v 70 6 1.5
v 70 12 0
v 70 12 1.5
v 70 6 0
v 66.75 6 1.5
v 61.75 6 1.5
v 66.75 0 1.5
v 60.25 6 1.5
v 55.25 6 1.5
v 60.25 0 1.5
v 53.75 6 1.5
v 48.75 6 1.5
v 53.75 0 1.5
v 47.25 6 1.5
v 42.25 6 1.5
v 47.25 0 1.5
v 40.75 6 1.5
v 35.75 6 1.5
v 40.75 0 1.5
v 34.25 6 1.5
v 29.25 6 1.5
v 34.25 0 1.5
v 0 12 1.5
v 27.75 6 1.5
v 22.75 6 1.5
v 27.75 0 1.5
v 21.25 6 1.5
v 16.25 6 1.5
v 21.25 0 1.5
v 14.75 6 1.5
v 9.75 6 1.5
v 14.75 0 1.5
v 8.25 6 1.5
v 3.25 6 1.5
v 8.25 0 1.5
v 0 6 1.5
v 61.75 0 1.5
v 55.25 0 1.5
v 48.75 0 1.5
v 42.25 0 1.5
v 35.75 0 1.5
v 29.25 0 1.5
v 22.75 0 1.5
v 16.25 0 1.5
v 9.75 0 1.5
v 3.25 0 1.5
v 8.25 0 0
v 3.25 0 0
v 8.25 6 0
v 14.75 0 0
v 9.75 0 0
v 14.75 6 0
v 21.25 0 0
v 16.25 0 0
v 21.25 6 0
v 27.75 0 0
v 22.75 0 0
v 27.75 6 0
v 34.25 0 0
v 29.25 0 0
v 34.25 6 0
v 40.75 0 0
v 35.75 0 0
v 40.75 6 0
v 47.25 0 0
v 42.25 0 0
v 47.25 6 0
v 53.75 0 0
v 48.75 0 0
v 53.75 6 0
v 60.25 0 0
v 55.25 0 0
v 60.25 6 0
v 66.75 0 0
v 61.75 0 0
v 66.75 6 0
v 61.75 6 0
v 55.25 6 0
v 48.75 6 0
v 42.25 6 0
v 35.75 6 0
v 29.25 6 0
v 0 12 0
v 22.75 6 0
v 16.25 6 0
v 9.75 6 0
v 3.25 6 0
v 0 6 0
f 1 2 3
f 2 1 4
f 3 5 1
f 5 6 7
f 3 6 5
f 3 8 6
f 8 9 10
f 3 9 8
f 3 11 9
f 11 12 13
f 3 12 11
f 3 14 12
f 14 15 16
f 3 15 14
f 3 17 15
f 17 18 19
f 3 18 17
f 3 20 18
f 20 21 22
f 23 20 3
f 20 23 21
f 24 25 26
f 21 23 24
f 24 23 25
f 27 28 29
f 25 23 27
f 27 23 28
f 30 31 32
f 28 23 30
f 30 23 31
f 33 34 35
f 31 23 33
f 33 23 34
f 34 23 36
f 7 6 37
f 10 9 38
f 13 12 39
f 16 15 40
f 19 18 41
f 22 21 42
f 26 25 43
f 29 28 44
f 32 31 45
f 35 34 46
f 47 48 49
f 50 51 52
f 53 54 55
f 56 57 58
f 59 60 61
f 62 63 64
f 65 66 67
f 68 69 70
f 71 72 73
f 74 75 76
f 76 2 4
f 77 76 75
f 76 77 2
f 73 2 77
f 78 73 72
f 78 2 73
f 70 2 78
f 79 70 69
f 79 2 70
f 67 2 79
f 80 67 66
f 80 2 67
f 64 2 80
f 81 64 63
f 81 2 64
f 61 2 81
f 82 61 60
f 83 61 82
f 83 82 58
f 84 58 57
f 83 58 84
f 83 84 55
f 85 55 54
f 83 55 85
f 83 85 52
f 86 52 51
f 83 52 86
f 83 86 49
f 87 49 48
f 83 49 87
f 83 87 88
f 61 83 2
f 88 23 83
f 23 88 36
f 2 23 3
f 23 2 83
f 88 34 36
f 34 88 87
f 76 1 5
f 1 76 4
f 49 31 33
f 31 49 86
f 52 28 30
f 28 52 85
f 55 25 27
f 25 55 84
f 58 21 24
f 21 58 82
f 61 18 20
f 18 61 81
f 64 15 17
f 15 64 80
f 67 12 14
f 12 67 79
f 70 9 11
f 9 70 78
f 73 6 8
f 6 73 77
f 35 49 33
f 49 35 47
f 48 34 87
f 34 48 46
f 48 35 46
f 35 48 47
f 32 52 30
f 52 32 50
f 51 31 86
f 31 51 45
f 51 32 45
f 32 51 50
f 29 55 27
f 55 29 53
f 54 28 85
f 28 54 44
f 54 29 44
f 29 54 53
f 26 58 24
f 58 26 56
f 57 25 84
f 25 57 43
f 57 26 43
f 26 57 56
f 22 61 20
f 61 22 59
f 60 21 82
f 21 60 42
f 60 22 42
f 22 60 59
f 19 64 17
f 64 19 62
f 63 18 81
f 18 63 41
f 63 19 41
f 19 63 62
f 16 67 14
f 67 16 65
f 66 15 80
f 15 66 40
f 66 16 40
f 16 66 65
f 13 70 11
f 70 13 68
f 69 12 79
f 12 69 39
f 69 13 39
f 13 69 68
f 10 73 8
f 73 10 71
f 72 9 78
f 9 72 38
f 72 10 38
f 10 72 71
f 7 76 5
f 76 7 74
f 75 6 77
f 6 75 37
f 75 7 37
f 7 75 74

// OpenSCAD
// 10-well Agarose Gel Comb
// Designed for FDM printing, lying flat on the XY plane (Z=0).
// Dimensions in millimetres.

// --- Dimensions ---
$fn = 100; // High resolution for smooth edges

// Spine dimensions
SPINE_LENGTH = 70;  // X
SPINE_WIDTH = 12;   // Y
PLATE_THICKNESS = 1.5; // Z

// Tooth dimensions
TOOTH_WIDTH = 5.0;  // X
TOOTH_LENGTH = 12;  // Y (extends from spine edge)
NUM_TEETH = 10;
GAP_SIZE = 1.5;     // Gap between teeth

// --- Calculations ---
// Total width of the tooth row
TOOTH_ROW_WIDTH = (NUM_TEETH * TOOTH_WIDTH) + ((NUM_TEETH - 1) * GAP_SIZE);

// Offset to center the tooth row on the spine in X
X_OFFSET = (SPINE_LENGTH - TOOTH_ROW_WIDTH) / 2;

// Position of the spine edge where teeth hang (in -Y direction)
// Spine goes from -SPINE_WIDTH/2 to +SPINE_WIDTH/2.
// Teeth hang from the edge at -SPINE_WIDTH/2.
SPINE_EDGE_Y = -SPINE_WIDTH / 2;

// --- Main Body (Spine) ---
// Create the flat plate spine
difference() {
    // Outer block
    cube([SPINE_LENGTH, SPINE_WIDTH, PLATE_THICKNESS], center = false);
    
    // Cut out the area where teeth will hang to ensure clean separation
    // We cut a rectangle slightly larger than the tooth row to remove the spine material
    // extending into the tooth area.
    translate([0, SPINE_EDGE_Y - 0.1, 0]) {
        cube([SPINE_LENGTH, TOOTH_LENGTH + 0.1, PLATE_THICKNESS]);
    }
}

// --- Teeth ---
// Loop to create 10 teeth
for (i = [0 : NUM_TEETH - 1]) {
    // Calculate X position for this tooth
    // Start at X_OFFSET, add tooth width and gaps
    current_x = X_OFFSET + (i * (TOOTH_WIDTH + GAP_SIZE));
    
    // Calculate Y position for this tooth
    // Centered on the spine edge in Y
    current_y = SPINE_EDGE_Y + (TOOTH_LENGTH / 2);
    
    translate([current_x, current_y, 0]) {
        // Tooth geometry: 5mm wide (X), 12mm long (Y), 1.5mm thick (Z)
        // Since the spine was cut out, we just extrude the tooth shape
        cube([TOOTH_WIDTH, TOOTH_LENGTH, PLATE_THICKNESS], center = false);
    }
}
